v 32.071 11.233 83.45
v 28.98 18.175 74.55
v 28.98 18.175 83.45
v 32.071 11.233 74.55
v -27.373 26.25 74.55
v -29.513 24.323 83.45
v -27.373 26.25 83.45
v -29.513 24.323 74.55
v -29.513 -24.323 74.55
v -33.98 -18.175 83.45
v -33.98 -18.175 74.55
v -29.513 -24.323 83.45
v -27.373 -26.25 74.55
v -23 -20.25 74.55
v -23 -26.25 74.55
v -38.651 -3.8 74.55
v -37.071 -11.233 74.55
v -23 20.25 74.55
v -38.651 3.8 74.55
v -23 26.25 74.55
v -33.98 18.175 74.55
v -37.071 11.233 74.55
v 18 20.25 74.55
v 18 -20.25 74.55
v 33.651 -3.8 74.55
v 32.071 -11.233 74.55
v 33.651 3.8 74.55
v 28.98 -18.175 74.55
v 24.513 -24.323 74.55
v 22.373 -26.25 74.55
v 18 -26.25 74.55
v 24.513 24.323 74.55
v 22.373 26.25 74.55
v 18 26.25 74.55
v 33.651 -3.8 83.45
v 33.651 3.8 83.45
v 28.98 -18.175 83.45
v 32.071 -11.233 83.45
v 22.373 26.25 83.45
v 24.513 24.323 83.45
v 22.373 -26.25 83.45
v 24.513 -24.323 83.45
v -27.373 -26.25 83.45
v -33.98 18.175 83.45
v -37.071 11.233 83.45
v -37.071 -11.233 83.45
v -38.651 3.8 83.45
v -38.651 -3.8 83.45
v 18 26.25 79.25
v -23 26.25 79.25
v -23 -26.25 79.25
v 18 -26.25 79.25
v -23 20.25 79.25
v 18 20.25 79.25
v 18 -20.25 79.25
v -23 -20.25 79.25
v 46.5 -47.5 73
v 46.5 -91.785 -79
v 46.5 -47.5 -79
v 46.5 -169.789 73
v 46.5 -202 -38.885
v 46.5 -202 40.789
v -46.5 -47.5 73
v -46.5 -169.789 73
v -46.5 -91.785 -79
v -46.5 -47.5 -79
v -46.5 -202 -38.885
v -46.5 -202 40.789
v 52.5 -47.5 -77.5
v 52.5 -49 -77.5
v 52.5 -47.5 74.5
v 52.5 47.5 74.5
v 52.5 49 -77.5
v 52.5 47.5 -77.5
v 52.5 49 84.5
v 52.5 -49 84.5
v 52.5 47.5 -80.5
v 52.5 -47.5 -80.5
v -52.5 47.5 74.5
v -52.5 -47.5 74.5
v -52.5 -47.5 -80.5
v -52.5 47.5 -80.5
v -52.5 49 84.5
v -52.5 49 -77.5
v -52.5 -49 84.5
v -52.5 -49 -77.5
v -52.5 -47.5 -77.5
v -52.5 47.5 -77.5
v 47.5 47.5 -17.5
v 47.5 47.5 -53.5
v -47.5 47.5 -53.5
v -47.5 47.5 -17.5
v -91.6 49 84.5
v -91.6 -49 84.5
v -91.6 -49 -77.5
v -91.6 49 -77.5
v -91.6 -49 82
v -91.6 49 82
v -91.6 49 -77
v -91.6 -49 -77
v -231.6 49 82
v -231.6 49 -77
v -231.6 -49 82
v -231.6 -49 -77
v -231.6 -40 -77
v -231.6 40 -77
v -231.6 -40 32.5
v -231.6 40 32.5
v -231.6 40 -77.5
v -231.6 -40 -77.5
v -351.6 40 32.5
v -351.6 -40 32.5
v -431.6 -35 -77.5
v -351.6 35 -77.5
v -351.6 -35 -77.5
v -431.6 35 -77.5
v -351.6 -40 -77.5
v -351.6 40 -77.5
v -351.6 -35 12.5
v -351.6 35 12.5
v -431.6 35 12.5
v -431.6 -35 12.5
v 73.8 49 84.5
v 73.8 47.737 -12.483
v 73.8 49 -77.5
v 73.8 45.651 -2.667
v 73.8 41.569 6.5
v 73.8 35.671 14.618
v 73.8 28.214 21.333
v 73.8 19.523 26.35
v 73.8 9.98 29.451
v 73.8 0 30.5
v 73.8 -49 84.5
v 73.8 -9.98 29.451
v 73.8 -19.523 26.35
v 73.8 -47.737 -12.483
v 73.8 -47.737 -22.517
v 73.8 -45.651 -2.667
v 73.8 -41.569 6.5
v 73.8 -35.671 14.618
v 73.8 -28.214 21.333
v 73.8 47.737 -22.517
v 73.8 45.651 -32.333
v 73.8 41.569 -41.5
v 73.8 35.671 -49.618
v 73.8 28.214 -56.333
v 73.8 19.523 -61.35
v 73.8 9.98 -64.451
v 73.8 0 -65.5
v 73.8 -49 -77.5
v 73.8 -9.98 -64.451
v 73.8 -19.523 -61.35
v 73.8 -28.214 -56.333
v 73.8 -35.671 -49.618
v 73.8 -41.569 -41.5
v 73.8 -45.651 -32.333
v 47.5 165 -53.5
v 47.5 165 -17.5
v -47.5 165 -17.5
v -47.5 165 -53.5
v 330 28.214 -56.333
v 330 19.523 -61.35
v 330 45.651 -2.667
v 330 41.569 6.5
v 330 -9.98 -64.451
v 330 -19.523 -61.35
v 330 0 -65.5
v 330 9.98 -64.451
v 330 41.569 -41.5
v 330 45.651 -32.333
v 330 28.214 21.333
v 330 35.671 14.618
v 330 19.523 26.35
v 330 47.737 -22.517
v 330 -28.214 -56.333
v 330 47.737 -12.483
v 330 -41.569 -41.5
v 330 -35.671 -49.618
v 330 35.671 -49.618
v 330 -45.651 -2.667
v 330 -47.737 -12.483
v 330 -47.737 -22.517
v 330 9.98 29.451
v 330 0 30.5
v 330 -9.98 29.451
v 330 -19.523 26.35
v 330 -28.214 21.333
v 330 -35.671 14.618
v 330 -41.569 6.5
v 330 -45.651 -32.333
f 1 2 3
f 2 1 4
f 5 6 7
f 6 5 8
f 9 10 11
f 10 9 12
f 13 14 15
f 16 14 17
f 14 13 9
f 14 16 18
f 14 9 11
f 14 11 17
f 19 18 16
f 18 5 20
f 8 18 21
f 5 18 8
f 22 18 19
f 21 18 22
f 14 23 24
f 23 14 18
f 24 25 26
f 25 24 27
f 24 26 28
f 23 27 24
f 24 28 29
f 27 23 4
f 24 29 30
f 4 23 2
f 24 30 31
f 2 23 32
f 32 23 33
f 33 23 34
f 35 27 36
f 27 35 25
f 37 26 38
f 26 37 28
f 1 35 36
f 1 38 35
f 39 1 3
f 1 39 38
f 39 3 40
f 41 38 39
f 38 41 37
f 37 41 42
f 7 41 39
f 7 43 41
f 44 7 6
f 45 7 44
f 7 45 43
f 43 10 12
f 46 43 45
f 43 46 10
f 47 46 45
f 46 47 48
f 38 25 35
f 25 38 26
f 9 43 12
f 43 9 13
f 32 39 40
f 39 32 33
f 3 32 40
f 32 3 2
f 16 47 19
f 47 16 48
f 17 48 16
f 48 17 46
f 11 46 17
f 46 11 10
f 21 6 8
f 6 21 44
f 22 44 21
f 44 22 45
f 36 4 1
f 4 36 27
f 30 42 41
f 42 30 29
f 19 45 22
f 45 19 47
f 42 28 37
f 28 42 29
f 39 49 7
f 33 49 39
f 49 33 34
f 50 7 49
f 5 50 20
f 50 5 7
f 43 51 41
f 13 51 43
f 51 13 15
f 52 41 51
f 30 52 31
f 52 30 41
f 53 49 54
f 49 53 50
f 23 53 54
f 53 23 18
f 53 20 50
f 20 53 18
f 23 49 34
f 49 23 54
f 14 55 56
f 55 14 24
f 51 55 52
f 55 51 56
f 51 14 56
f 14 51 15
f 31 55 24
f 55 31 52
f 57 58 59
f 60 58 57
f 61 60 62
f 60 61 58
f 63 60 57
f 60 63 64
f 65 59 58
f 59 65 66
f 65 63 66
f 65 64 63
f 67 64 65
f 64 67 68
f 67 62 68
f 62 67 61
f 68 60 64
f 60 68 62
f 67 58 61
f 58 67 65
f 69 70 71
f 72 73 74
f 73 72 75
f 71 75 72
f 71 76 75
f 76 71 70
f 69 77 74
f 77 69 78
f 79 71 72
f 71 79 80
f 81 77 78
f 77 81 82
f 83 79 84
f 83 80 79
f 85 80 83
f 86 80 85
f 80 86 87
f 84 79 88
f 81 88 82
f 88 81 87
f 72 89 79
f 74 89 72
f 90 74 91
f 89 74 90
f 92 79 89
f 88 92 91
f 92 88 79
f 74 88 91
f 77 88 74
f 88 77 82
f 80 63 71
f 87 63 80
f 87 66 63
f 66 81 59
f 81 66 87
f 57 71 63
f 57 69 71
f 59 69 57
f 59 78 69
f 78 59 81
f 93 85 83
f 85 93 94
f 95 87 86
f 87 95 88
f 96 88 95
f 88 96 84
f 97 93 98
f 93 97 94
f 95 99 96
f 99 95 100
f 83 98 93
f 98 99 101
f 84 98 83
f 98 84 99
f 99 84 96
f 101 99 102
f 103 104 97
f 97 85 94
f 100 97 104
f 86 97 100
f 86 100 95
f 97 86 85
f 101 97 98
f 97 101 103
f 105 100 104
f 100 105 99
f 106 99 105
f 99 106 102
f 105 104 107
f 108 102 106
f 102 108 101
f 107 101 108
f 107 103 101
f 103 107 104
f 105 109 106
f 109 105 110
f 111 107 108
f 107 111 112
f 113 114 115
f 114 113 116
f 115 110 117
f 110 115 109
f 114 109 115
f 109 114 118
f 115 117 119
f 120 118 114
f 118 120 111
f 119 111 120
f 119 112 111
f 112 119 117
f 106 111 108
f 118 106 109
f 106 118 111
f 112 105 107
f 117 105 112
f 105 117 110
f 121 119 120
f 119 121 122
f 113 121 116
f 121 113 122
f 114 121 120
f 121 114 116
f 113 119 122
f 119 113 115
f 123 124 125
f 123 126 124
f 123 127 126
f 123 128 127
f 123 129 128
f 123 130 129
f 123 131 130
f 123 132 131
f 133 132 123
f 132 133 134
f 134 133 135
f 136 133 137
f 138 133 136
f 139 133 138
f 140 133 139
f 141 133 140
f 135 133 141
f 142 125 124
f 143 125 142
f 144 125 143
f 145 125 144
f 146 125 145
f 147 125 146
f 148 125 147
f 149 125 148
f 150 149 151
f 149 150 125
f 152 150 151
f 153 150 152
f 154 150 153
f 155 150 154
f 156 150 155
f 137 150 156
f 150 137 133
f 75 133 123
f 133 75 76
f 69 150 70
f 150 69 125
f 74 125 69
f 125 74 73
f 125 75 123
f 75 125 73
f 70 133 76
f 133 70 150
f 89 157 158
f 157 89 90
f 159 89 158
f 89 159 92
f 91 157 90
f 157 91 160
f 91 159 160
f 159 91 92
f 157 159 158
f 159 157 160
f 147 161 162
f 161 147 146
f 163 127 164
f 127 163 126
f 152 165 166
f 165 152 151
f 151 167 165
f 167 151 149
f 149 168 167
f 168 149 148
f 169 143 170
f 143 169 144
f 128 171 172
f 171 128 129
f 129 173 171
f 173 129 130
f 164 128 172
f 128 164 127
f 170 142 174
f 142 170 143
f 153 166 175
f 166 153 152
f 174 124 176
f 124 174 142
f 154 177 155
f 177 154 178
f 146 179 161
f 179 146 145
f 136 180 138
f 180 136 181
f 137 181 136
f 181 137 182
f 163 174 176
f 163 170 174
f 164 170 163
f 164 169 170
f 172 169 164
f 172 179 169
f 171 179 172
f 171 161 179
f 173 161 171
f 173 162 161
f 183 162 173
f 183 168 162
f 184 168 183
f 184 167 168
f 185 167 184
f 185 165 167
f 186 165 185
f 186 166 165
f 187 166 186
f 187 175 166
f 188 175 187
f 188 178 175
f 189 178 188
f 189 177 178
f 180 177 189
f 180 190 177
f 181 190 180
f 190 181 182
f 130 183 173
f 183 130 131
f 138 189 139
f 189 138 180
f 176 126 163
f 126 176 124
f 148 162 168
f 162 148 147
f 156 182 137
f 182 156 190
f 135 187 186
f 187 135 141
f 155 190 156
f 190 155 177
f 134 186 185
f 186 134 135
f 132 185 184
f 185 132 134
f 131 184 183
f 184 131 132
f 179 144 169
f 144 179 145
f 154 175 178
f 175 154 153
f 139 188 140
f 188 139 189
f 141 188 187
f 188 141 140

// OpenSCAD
module bracket() {
difference() {
intersection() {
cylinder(r=72.7/2,h=8.9,center=true);
cube([52.5,90,10],center=true);
}
translate([40.25,0,-6.5/2]) cube([40,41,7],center=true);
translate([-40.25,0,-6.5/2]) cube([40,41,7],center=true);
//translate([-46,0,0]) cube([40,40,5],center=true);
}
}

module ammobox() {
difference () {
cube([93,155,152],center=true);
translate([0,-96,96]) rotate([45,0,0]) cube([100,100,100],center=true);
translate([0,-86,-86]) rotate([70,0,0]) cube([100,100,250],center=true);
}
}

module vulcan() {
union() {
translate([0,0,-3])cube([105,95,155],center=true);
translate([-(105+39.1)/2,0,3.5])cube([39.1,98,162],center=true);
translate([-(105+140)/2-39.1,0,2.5])cube([140,98,159],center=true);
translate([-(105+120)/2-140-39.1,0,4.5-(164-110)/2])cube([120,80,110],center=true);
translate([-(105+80)/2-140-39.1-120,0,4.5-(164-90)/2])cube([80,70,90],center=true);translate([(105+21.3)/2,0,3.5])cube([21.3,98,162],center=true);
translate([0,90,-95+155/2-36/2])cube([95,150,36],center=true);
translate([200,0,-95+155/2])rotate([0,90,0]) cylinder(r=48,h=260,center=true);
translate([-2.5,0,79]) rotate(90) bracket();
translate([0,-(98+155)/2+2,-3])ammobox();

}
}
vulcan();
